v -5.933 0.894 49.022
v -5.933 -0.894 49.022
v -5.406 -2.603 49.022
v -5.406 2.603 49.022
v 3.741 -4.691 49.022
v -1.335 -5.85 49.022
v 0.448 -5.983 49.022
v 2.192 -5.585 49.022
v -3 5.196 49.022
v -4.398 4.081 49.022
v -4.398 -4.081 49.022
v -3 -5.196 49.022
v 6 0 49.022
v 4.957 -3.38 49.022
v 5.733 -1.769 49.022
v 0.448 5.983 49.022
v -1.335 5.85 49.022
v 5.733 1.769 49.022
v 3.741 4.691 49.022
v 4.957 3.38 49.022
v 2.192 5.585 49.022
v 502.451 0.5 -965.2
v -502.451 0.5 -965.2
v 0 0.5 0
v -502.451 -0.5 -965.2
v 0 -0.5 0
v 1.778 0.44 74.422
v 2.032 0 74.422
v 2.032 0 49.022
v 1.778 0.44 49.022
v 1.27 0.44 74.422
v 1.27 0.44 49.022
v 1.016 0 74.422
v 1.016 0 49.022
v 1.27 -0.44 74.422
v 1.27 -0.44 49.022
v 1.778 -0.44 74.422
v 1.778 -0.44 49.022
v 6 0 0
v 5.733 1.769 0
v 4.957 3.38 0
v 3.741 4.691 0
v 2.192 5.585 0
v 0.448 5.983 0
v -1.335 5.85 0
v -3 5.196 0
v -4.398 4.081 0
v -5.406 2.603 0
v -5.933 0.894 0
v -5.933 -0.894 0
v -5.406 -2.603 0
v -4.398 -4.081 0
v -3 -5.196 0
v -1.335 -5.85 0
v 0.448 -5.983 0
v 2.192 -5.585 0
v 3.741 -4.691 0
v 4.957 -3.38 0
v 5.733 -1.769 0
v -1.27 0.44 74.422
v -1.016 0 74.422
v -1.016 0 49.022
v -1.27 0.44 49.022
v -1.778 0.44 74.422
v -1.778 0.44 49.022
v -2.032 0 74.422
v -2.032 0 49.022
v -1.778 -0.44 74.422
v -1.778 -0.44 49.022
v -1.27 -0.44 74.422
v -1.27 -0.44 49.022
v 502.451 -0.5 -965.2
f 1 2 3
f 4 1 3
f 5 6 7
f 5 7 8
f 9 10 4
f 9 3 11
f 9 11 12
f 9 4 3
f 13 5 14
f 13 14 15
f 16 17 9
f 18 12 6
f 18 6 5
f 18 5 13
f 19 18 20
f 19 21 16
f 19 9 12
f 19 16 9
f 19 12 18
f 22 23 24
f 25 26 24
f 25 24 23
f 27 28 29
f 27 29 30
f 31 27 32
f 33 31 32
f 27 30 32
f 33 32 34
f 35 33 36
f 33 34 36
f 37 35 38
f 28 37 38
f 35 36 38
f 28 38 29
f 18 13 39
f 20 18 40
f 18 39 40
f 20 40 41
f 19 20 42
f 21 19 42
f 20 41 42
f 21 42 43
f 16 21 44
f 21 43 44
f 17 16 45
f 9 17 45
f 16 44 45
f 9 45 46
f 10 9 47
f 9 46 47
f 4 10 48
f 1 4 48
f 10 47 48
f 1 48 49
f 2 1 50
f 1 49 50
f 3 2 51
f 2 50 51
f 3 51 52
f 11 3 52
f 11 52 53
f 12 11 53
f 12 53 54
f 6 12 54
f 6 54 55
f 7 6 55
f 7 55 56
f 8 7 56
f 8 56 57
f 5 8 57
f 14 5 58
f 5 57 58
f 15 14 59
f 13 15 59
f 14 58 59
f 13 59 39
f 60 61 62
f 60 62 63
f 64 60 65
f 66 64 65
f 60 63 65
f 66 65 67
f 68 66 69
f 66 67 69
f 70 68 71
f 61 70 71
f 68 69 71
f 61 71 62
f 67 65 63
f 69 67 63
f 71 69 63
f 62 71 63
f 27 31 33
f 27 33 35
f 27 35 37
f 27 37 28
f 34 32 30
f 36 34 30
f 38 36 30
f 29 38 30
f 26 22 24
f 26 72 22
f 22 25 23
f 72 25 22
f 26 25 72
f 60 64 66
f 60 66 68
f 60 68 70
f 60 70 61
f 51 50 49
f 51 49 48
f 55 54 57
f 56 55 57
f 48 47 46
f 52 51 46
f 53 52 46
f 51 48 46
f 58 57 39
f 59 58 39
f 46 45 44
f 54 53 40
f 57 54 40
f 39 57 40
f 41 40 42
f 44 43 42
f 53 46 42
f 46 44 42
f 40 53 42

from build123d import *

# Parameters (mm, degrees)
F0_R     = 6
F1_DEPTH = 49.022
F2_R     = 0.508
F3_DEPTH = 25.4
F4_R     = 0.508
F5_DEPTH = 25.4
F7_DEPTH = 0.5
F9_DEPTH = 6.501


# Not quite as in the source:
# - a feature of the source that left no trace in its solid (it failed there, or was rolled back) is left out


with BuildPart() as f1:
    # F0 (on Top) → F1 (new body)
    with BuildSketch(Plane.XY):
        Circle(F0_R)
    extrude(amount=F1_DEPTH)

    # F8 (on face) → F9 (cut, through all)
    with BuildSketch(Plane.XZ.offset(0.5)):
        Polygon((108.475908637, 0), (38.0572463157, -73.1072899742), (366.4362130725, -703.9174159872), (858.39933024, -722.3438895265), align=None)
    extrude(amount=-F9_DEPTH, mode=Mode.SUBTRACT)


with BuildPart() as f3:
    # F2 (on face) → F3 (new body)
    with BuildSketch(Plane.XY.offset(49.022)):
        with Locations((-1.524, 0)):
            Circle(F2_R)
    extrude(amount=F3_DEPTH)


with BuildPart() as f5:
    # F4 (on face) → F5 (new body)
    with BuildSketch(Plane.XY.offset(49.022)):
        with Locations((1.524, 0)):
            Circle(F4_R)
    extrude(amount=F5_DEPTH)


with BuildPart() as f7:
    # F6 (on Front) → F7 (new body, symmetric)
    with BuildSketch(Plane.XZ):
        Polygon((502.4513171925, -965.2), (0, 0), (-502.4513171925, -965.2), align=None)
    extrude(amount=F7_DEPTH, both=True)


solid = Compound([f1.part, f3.part, f5.part, f7.part])
